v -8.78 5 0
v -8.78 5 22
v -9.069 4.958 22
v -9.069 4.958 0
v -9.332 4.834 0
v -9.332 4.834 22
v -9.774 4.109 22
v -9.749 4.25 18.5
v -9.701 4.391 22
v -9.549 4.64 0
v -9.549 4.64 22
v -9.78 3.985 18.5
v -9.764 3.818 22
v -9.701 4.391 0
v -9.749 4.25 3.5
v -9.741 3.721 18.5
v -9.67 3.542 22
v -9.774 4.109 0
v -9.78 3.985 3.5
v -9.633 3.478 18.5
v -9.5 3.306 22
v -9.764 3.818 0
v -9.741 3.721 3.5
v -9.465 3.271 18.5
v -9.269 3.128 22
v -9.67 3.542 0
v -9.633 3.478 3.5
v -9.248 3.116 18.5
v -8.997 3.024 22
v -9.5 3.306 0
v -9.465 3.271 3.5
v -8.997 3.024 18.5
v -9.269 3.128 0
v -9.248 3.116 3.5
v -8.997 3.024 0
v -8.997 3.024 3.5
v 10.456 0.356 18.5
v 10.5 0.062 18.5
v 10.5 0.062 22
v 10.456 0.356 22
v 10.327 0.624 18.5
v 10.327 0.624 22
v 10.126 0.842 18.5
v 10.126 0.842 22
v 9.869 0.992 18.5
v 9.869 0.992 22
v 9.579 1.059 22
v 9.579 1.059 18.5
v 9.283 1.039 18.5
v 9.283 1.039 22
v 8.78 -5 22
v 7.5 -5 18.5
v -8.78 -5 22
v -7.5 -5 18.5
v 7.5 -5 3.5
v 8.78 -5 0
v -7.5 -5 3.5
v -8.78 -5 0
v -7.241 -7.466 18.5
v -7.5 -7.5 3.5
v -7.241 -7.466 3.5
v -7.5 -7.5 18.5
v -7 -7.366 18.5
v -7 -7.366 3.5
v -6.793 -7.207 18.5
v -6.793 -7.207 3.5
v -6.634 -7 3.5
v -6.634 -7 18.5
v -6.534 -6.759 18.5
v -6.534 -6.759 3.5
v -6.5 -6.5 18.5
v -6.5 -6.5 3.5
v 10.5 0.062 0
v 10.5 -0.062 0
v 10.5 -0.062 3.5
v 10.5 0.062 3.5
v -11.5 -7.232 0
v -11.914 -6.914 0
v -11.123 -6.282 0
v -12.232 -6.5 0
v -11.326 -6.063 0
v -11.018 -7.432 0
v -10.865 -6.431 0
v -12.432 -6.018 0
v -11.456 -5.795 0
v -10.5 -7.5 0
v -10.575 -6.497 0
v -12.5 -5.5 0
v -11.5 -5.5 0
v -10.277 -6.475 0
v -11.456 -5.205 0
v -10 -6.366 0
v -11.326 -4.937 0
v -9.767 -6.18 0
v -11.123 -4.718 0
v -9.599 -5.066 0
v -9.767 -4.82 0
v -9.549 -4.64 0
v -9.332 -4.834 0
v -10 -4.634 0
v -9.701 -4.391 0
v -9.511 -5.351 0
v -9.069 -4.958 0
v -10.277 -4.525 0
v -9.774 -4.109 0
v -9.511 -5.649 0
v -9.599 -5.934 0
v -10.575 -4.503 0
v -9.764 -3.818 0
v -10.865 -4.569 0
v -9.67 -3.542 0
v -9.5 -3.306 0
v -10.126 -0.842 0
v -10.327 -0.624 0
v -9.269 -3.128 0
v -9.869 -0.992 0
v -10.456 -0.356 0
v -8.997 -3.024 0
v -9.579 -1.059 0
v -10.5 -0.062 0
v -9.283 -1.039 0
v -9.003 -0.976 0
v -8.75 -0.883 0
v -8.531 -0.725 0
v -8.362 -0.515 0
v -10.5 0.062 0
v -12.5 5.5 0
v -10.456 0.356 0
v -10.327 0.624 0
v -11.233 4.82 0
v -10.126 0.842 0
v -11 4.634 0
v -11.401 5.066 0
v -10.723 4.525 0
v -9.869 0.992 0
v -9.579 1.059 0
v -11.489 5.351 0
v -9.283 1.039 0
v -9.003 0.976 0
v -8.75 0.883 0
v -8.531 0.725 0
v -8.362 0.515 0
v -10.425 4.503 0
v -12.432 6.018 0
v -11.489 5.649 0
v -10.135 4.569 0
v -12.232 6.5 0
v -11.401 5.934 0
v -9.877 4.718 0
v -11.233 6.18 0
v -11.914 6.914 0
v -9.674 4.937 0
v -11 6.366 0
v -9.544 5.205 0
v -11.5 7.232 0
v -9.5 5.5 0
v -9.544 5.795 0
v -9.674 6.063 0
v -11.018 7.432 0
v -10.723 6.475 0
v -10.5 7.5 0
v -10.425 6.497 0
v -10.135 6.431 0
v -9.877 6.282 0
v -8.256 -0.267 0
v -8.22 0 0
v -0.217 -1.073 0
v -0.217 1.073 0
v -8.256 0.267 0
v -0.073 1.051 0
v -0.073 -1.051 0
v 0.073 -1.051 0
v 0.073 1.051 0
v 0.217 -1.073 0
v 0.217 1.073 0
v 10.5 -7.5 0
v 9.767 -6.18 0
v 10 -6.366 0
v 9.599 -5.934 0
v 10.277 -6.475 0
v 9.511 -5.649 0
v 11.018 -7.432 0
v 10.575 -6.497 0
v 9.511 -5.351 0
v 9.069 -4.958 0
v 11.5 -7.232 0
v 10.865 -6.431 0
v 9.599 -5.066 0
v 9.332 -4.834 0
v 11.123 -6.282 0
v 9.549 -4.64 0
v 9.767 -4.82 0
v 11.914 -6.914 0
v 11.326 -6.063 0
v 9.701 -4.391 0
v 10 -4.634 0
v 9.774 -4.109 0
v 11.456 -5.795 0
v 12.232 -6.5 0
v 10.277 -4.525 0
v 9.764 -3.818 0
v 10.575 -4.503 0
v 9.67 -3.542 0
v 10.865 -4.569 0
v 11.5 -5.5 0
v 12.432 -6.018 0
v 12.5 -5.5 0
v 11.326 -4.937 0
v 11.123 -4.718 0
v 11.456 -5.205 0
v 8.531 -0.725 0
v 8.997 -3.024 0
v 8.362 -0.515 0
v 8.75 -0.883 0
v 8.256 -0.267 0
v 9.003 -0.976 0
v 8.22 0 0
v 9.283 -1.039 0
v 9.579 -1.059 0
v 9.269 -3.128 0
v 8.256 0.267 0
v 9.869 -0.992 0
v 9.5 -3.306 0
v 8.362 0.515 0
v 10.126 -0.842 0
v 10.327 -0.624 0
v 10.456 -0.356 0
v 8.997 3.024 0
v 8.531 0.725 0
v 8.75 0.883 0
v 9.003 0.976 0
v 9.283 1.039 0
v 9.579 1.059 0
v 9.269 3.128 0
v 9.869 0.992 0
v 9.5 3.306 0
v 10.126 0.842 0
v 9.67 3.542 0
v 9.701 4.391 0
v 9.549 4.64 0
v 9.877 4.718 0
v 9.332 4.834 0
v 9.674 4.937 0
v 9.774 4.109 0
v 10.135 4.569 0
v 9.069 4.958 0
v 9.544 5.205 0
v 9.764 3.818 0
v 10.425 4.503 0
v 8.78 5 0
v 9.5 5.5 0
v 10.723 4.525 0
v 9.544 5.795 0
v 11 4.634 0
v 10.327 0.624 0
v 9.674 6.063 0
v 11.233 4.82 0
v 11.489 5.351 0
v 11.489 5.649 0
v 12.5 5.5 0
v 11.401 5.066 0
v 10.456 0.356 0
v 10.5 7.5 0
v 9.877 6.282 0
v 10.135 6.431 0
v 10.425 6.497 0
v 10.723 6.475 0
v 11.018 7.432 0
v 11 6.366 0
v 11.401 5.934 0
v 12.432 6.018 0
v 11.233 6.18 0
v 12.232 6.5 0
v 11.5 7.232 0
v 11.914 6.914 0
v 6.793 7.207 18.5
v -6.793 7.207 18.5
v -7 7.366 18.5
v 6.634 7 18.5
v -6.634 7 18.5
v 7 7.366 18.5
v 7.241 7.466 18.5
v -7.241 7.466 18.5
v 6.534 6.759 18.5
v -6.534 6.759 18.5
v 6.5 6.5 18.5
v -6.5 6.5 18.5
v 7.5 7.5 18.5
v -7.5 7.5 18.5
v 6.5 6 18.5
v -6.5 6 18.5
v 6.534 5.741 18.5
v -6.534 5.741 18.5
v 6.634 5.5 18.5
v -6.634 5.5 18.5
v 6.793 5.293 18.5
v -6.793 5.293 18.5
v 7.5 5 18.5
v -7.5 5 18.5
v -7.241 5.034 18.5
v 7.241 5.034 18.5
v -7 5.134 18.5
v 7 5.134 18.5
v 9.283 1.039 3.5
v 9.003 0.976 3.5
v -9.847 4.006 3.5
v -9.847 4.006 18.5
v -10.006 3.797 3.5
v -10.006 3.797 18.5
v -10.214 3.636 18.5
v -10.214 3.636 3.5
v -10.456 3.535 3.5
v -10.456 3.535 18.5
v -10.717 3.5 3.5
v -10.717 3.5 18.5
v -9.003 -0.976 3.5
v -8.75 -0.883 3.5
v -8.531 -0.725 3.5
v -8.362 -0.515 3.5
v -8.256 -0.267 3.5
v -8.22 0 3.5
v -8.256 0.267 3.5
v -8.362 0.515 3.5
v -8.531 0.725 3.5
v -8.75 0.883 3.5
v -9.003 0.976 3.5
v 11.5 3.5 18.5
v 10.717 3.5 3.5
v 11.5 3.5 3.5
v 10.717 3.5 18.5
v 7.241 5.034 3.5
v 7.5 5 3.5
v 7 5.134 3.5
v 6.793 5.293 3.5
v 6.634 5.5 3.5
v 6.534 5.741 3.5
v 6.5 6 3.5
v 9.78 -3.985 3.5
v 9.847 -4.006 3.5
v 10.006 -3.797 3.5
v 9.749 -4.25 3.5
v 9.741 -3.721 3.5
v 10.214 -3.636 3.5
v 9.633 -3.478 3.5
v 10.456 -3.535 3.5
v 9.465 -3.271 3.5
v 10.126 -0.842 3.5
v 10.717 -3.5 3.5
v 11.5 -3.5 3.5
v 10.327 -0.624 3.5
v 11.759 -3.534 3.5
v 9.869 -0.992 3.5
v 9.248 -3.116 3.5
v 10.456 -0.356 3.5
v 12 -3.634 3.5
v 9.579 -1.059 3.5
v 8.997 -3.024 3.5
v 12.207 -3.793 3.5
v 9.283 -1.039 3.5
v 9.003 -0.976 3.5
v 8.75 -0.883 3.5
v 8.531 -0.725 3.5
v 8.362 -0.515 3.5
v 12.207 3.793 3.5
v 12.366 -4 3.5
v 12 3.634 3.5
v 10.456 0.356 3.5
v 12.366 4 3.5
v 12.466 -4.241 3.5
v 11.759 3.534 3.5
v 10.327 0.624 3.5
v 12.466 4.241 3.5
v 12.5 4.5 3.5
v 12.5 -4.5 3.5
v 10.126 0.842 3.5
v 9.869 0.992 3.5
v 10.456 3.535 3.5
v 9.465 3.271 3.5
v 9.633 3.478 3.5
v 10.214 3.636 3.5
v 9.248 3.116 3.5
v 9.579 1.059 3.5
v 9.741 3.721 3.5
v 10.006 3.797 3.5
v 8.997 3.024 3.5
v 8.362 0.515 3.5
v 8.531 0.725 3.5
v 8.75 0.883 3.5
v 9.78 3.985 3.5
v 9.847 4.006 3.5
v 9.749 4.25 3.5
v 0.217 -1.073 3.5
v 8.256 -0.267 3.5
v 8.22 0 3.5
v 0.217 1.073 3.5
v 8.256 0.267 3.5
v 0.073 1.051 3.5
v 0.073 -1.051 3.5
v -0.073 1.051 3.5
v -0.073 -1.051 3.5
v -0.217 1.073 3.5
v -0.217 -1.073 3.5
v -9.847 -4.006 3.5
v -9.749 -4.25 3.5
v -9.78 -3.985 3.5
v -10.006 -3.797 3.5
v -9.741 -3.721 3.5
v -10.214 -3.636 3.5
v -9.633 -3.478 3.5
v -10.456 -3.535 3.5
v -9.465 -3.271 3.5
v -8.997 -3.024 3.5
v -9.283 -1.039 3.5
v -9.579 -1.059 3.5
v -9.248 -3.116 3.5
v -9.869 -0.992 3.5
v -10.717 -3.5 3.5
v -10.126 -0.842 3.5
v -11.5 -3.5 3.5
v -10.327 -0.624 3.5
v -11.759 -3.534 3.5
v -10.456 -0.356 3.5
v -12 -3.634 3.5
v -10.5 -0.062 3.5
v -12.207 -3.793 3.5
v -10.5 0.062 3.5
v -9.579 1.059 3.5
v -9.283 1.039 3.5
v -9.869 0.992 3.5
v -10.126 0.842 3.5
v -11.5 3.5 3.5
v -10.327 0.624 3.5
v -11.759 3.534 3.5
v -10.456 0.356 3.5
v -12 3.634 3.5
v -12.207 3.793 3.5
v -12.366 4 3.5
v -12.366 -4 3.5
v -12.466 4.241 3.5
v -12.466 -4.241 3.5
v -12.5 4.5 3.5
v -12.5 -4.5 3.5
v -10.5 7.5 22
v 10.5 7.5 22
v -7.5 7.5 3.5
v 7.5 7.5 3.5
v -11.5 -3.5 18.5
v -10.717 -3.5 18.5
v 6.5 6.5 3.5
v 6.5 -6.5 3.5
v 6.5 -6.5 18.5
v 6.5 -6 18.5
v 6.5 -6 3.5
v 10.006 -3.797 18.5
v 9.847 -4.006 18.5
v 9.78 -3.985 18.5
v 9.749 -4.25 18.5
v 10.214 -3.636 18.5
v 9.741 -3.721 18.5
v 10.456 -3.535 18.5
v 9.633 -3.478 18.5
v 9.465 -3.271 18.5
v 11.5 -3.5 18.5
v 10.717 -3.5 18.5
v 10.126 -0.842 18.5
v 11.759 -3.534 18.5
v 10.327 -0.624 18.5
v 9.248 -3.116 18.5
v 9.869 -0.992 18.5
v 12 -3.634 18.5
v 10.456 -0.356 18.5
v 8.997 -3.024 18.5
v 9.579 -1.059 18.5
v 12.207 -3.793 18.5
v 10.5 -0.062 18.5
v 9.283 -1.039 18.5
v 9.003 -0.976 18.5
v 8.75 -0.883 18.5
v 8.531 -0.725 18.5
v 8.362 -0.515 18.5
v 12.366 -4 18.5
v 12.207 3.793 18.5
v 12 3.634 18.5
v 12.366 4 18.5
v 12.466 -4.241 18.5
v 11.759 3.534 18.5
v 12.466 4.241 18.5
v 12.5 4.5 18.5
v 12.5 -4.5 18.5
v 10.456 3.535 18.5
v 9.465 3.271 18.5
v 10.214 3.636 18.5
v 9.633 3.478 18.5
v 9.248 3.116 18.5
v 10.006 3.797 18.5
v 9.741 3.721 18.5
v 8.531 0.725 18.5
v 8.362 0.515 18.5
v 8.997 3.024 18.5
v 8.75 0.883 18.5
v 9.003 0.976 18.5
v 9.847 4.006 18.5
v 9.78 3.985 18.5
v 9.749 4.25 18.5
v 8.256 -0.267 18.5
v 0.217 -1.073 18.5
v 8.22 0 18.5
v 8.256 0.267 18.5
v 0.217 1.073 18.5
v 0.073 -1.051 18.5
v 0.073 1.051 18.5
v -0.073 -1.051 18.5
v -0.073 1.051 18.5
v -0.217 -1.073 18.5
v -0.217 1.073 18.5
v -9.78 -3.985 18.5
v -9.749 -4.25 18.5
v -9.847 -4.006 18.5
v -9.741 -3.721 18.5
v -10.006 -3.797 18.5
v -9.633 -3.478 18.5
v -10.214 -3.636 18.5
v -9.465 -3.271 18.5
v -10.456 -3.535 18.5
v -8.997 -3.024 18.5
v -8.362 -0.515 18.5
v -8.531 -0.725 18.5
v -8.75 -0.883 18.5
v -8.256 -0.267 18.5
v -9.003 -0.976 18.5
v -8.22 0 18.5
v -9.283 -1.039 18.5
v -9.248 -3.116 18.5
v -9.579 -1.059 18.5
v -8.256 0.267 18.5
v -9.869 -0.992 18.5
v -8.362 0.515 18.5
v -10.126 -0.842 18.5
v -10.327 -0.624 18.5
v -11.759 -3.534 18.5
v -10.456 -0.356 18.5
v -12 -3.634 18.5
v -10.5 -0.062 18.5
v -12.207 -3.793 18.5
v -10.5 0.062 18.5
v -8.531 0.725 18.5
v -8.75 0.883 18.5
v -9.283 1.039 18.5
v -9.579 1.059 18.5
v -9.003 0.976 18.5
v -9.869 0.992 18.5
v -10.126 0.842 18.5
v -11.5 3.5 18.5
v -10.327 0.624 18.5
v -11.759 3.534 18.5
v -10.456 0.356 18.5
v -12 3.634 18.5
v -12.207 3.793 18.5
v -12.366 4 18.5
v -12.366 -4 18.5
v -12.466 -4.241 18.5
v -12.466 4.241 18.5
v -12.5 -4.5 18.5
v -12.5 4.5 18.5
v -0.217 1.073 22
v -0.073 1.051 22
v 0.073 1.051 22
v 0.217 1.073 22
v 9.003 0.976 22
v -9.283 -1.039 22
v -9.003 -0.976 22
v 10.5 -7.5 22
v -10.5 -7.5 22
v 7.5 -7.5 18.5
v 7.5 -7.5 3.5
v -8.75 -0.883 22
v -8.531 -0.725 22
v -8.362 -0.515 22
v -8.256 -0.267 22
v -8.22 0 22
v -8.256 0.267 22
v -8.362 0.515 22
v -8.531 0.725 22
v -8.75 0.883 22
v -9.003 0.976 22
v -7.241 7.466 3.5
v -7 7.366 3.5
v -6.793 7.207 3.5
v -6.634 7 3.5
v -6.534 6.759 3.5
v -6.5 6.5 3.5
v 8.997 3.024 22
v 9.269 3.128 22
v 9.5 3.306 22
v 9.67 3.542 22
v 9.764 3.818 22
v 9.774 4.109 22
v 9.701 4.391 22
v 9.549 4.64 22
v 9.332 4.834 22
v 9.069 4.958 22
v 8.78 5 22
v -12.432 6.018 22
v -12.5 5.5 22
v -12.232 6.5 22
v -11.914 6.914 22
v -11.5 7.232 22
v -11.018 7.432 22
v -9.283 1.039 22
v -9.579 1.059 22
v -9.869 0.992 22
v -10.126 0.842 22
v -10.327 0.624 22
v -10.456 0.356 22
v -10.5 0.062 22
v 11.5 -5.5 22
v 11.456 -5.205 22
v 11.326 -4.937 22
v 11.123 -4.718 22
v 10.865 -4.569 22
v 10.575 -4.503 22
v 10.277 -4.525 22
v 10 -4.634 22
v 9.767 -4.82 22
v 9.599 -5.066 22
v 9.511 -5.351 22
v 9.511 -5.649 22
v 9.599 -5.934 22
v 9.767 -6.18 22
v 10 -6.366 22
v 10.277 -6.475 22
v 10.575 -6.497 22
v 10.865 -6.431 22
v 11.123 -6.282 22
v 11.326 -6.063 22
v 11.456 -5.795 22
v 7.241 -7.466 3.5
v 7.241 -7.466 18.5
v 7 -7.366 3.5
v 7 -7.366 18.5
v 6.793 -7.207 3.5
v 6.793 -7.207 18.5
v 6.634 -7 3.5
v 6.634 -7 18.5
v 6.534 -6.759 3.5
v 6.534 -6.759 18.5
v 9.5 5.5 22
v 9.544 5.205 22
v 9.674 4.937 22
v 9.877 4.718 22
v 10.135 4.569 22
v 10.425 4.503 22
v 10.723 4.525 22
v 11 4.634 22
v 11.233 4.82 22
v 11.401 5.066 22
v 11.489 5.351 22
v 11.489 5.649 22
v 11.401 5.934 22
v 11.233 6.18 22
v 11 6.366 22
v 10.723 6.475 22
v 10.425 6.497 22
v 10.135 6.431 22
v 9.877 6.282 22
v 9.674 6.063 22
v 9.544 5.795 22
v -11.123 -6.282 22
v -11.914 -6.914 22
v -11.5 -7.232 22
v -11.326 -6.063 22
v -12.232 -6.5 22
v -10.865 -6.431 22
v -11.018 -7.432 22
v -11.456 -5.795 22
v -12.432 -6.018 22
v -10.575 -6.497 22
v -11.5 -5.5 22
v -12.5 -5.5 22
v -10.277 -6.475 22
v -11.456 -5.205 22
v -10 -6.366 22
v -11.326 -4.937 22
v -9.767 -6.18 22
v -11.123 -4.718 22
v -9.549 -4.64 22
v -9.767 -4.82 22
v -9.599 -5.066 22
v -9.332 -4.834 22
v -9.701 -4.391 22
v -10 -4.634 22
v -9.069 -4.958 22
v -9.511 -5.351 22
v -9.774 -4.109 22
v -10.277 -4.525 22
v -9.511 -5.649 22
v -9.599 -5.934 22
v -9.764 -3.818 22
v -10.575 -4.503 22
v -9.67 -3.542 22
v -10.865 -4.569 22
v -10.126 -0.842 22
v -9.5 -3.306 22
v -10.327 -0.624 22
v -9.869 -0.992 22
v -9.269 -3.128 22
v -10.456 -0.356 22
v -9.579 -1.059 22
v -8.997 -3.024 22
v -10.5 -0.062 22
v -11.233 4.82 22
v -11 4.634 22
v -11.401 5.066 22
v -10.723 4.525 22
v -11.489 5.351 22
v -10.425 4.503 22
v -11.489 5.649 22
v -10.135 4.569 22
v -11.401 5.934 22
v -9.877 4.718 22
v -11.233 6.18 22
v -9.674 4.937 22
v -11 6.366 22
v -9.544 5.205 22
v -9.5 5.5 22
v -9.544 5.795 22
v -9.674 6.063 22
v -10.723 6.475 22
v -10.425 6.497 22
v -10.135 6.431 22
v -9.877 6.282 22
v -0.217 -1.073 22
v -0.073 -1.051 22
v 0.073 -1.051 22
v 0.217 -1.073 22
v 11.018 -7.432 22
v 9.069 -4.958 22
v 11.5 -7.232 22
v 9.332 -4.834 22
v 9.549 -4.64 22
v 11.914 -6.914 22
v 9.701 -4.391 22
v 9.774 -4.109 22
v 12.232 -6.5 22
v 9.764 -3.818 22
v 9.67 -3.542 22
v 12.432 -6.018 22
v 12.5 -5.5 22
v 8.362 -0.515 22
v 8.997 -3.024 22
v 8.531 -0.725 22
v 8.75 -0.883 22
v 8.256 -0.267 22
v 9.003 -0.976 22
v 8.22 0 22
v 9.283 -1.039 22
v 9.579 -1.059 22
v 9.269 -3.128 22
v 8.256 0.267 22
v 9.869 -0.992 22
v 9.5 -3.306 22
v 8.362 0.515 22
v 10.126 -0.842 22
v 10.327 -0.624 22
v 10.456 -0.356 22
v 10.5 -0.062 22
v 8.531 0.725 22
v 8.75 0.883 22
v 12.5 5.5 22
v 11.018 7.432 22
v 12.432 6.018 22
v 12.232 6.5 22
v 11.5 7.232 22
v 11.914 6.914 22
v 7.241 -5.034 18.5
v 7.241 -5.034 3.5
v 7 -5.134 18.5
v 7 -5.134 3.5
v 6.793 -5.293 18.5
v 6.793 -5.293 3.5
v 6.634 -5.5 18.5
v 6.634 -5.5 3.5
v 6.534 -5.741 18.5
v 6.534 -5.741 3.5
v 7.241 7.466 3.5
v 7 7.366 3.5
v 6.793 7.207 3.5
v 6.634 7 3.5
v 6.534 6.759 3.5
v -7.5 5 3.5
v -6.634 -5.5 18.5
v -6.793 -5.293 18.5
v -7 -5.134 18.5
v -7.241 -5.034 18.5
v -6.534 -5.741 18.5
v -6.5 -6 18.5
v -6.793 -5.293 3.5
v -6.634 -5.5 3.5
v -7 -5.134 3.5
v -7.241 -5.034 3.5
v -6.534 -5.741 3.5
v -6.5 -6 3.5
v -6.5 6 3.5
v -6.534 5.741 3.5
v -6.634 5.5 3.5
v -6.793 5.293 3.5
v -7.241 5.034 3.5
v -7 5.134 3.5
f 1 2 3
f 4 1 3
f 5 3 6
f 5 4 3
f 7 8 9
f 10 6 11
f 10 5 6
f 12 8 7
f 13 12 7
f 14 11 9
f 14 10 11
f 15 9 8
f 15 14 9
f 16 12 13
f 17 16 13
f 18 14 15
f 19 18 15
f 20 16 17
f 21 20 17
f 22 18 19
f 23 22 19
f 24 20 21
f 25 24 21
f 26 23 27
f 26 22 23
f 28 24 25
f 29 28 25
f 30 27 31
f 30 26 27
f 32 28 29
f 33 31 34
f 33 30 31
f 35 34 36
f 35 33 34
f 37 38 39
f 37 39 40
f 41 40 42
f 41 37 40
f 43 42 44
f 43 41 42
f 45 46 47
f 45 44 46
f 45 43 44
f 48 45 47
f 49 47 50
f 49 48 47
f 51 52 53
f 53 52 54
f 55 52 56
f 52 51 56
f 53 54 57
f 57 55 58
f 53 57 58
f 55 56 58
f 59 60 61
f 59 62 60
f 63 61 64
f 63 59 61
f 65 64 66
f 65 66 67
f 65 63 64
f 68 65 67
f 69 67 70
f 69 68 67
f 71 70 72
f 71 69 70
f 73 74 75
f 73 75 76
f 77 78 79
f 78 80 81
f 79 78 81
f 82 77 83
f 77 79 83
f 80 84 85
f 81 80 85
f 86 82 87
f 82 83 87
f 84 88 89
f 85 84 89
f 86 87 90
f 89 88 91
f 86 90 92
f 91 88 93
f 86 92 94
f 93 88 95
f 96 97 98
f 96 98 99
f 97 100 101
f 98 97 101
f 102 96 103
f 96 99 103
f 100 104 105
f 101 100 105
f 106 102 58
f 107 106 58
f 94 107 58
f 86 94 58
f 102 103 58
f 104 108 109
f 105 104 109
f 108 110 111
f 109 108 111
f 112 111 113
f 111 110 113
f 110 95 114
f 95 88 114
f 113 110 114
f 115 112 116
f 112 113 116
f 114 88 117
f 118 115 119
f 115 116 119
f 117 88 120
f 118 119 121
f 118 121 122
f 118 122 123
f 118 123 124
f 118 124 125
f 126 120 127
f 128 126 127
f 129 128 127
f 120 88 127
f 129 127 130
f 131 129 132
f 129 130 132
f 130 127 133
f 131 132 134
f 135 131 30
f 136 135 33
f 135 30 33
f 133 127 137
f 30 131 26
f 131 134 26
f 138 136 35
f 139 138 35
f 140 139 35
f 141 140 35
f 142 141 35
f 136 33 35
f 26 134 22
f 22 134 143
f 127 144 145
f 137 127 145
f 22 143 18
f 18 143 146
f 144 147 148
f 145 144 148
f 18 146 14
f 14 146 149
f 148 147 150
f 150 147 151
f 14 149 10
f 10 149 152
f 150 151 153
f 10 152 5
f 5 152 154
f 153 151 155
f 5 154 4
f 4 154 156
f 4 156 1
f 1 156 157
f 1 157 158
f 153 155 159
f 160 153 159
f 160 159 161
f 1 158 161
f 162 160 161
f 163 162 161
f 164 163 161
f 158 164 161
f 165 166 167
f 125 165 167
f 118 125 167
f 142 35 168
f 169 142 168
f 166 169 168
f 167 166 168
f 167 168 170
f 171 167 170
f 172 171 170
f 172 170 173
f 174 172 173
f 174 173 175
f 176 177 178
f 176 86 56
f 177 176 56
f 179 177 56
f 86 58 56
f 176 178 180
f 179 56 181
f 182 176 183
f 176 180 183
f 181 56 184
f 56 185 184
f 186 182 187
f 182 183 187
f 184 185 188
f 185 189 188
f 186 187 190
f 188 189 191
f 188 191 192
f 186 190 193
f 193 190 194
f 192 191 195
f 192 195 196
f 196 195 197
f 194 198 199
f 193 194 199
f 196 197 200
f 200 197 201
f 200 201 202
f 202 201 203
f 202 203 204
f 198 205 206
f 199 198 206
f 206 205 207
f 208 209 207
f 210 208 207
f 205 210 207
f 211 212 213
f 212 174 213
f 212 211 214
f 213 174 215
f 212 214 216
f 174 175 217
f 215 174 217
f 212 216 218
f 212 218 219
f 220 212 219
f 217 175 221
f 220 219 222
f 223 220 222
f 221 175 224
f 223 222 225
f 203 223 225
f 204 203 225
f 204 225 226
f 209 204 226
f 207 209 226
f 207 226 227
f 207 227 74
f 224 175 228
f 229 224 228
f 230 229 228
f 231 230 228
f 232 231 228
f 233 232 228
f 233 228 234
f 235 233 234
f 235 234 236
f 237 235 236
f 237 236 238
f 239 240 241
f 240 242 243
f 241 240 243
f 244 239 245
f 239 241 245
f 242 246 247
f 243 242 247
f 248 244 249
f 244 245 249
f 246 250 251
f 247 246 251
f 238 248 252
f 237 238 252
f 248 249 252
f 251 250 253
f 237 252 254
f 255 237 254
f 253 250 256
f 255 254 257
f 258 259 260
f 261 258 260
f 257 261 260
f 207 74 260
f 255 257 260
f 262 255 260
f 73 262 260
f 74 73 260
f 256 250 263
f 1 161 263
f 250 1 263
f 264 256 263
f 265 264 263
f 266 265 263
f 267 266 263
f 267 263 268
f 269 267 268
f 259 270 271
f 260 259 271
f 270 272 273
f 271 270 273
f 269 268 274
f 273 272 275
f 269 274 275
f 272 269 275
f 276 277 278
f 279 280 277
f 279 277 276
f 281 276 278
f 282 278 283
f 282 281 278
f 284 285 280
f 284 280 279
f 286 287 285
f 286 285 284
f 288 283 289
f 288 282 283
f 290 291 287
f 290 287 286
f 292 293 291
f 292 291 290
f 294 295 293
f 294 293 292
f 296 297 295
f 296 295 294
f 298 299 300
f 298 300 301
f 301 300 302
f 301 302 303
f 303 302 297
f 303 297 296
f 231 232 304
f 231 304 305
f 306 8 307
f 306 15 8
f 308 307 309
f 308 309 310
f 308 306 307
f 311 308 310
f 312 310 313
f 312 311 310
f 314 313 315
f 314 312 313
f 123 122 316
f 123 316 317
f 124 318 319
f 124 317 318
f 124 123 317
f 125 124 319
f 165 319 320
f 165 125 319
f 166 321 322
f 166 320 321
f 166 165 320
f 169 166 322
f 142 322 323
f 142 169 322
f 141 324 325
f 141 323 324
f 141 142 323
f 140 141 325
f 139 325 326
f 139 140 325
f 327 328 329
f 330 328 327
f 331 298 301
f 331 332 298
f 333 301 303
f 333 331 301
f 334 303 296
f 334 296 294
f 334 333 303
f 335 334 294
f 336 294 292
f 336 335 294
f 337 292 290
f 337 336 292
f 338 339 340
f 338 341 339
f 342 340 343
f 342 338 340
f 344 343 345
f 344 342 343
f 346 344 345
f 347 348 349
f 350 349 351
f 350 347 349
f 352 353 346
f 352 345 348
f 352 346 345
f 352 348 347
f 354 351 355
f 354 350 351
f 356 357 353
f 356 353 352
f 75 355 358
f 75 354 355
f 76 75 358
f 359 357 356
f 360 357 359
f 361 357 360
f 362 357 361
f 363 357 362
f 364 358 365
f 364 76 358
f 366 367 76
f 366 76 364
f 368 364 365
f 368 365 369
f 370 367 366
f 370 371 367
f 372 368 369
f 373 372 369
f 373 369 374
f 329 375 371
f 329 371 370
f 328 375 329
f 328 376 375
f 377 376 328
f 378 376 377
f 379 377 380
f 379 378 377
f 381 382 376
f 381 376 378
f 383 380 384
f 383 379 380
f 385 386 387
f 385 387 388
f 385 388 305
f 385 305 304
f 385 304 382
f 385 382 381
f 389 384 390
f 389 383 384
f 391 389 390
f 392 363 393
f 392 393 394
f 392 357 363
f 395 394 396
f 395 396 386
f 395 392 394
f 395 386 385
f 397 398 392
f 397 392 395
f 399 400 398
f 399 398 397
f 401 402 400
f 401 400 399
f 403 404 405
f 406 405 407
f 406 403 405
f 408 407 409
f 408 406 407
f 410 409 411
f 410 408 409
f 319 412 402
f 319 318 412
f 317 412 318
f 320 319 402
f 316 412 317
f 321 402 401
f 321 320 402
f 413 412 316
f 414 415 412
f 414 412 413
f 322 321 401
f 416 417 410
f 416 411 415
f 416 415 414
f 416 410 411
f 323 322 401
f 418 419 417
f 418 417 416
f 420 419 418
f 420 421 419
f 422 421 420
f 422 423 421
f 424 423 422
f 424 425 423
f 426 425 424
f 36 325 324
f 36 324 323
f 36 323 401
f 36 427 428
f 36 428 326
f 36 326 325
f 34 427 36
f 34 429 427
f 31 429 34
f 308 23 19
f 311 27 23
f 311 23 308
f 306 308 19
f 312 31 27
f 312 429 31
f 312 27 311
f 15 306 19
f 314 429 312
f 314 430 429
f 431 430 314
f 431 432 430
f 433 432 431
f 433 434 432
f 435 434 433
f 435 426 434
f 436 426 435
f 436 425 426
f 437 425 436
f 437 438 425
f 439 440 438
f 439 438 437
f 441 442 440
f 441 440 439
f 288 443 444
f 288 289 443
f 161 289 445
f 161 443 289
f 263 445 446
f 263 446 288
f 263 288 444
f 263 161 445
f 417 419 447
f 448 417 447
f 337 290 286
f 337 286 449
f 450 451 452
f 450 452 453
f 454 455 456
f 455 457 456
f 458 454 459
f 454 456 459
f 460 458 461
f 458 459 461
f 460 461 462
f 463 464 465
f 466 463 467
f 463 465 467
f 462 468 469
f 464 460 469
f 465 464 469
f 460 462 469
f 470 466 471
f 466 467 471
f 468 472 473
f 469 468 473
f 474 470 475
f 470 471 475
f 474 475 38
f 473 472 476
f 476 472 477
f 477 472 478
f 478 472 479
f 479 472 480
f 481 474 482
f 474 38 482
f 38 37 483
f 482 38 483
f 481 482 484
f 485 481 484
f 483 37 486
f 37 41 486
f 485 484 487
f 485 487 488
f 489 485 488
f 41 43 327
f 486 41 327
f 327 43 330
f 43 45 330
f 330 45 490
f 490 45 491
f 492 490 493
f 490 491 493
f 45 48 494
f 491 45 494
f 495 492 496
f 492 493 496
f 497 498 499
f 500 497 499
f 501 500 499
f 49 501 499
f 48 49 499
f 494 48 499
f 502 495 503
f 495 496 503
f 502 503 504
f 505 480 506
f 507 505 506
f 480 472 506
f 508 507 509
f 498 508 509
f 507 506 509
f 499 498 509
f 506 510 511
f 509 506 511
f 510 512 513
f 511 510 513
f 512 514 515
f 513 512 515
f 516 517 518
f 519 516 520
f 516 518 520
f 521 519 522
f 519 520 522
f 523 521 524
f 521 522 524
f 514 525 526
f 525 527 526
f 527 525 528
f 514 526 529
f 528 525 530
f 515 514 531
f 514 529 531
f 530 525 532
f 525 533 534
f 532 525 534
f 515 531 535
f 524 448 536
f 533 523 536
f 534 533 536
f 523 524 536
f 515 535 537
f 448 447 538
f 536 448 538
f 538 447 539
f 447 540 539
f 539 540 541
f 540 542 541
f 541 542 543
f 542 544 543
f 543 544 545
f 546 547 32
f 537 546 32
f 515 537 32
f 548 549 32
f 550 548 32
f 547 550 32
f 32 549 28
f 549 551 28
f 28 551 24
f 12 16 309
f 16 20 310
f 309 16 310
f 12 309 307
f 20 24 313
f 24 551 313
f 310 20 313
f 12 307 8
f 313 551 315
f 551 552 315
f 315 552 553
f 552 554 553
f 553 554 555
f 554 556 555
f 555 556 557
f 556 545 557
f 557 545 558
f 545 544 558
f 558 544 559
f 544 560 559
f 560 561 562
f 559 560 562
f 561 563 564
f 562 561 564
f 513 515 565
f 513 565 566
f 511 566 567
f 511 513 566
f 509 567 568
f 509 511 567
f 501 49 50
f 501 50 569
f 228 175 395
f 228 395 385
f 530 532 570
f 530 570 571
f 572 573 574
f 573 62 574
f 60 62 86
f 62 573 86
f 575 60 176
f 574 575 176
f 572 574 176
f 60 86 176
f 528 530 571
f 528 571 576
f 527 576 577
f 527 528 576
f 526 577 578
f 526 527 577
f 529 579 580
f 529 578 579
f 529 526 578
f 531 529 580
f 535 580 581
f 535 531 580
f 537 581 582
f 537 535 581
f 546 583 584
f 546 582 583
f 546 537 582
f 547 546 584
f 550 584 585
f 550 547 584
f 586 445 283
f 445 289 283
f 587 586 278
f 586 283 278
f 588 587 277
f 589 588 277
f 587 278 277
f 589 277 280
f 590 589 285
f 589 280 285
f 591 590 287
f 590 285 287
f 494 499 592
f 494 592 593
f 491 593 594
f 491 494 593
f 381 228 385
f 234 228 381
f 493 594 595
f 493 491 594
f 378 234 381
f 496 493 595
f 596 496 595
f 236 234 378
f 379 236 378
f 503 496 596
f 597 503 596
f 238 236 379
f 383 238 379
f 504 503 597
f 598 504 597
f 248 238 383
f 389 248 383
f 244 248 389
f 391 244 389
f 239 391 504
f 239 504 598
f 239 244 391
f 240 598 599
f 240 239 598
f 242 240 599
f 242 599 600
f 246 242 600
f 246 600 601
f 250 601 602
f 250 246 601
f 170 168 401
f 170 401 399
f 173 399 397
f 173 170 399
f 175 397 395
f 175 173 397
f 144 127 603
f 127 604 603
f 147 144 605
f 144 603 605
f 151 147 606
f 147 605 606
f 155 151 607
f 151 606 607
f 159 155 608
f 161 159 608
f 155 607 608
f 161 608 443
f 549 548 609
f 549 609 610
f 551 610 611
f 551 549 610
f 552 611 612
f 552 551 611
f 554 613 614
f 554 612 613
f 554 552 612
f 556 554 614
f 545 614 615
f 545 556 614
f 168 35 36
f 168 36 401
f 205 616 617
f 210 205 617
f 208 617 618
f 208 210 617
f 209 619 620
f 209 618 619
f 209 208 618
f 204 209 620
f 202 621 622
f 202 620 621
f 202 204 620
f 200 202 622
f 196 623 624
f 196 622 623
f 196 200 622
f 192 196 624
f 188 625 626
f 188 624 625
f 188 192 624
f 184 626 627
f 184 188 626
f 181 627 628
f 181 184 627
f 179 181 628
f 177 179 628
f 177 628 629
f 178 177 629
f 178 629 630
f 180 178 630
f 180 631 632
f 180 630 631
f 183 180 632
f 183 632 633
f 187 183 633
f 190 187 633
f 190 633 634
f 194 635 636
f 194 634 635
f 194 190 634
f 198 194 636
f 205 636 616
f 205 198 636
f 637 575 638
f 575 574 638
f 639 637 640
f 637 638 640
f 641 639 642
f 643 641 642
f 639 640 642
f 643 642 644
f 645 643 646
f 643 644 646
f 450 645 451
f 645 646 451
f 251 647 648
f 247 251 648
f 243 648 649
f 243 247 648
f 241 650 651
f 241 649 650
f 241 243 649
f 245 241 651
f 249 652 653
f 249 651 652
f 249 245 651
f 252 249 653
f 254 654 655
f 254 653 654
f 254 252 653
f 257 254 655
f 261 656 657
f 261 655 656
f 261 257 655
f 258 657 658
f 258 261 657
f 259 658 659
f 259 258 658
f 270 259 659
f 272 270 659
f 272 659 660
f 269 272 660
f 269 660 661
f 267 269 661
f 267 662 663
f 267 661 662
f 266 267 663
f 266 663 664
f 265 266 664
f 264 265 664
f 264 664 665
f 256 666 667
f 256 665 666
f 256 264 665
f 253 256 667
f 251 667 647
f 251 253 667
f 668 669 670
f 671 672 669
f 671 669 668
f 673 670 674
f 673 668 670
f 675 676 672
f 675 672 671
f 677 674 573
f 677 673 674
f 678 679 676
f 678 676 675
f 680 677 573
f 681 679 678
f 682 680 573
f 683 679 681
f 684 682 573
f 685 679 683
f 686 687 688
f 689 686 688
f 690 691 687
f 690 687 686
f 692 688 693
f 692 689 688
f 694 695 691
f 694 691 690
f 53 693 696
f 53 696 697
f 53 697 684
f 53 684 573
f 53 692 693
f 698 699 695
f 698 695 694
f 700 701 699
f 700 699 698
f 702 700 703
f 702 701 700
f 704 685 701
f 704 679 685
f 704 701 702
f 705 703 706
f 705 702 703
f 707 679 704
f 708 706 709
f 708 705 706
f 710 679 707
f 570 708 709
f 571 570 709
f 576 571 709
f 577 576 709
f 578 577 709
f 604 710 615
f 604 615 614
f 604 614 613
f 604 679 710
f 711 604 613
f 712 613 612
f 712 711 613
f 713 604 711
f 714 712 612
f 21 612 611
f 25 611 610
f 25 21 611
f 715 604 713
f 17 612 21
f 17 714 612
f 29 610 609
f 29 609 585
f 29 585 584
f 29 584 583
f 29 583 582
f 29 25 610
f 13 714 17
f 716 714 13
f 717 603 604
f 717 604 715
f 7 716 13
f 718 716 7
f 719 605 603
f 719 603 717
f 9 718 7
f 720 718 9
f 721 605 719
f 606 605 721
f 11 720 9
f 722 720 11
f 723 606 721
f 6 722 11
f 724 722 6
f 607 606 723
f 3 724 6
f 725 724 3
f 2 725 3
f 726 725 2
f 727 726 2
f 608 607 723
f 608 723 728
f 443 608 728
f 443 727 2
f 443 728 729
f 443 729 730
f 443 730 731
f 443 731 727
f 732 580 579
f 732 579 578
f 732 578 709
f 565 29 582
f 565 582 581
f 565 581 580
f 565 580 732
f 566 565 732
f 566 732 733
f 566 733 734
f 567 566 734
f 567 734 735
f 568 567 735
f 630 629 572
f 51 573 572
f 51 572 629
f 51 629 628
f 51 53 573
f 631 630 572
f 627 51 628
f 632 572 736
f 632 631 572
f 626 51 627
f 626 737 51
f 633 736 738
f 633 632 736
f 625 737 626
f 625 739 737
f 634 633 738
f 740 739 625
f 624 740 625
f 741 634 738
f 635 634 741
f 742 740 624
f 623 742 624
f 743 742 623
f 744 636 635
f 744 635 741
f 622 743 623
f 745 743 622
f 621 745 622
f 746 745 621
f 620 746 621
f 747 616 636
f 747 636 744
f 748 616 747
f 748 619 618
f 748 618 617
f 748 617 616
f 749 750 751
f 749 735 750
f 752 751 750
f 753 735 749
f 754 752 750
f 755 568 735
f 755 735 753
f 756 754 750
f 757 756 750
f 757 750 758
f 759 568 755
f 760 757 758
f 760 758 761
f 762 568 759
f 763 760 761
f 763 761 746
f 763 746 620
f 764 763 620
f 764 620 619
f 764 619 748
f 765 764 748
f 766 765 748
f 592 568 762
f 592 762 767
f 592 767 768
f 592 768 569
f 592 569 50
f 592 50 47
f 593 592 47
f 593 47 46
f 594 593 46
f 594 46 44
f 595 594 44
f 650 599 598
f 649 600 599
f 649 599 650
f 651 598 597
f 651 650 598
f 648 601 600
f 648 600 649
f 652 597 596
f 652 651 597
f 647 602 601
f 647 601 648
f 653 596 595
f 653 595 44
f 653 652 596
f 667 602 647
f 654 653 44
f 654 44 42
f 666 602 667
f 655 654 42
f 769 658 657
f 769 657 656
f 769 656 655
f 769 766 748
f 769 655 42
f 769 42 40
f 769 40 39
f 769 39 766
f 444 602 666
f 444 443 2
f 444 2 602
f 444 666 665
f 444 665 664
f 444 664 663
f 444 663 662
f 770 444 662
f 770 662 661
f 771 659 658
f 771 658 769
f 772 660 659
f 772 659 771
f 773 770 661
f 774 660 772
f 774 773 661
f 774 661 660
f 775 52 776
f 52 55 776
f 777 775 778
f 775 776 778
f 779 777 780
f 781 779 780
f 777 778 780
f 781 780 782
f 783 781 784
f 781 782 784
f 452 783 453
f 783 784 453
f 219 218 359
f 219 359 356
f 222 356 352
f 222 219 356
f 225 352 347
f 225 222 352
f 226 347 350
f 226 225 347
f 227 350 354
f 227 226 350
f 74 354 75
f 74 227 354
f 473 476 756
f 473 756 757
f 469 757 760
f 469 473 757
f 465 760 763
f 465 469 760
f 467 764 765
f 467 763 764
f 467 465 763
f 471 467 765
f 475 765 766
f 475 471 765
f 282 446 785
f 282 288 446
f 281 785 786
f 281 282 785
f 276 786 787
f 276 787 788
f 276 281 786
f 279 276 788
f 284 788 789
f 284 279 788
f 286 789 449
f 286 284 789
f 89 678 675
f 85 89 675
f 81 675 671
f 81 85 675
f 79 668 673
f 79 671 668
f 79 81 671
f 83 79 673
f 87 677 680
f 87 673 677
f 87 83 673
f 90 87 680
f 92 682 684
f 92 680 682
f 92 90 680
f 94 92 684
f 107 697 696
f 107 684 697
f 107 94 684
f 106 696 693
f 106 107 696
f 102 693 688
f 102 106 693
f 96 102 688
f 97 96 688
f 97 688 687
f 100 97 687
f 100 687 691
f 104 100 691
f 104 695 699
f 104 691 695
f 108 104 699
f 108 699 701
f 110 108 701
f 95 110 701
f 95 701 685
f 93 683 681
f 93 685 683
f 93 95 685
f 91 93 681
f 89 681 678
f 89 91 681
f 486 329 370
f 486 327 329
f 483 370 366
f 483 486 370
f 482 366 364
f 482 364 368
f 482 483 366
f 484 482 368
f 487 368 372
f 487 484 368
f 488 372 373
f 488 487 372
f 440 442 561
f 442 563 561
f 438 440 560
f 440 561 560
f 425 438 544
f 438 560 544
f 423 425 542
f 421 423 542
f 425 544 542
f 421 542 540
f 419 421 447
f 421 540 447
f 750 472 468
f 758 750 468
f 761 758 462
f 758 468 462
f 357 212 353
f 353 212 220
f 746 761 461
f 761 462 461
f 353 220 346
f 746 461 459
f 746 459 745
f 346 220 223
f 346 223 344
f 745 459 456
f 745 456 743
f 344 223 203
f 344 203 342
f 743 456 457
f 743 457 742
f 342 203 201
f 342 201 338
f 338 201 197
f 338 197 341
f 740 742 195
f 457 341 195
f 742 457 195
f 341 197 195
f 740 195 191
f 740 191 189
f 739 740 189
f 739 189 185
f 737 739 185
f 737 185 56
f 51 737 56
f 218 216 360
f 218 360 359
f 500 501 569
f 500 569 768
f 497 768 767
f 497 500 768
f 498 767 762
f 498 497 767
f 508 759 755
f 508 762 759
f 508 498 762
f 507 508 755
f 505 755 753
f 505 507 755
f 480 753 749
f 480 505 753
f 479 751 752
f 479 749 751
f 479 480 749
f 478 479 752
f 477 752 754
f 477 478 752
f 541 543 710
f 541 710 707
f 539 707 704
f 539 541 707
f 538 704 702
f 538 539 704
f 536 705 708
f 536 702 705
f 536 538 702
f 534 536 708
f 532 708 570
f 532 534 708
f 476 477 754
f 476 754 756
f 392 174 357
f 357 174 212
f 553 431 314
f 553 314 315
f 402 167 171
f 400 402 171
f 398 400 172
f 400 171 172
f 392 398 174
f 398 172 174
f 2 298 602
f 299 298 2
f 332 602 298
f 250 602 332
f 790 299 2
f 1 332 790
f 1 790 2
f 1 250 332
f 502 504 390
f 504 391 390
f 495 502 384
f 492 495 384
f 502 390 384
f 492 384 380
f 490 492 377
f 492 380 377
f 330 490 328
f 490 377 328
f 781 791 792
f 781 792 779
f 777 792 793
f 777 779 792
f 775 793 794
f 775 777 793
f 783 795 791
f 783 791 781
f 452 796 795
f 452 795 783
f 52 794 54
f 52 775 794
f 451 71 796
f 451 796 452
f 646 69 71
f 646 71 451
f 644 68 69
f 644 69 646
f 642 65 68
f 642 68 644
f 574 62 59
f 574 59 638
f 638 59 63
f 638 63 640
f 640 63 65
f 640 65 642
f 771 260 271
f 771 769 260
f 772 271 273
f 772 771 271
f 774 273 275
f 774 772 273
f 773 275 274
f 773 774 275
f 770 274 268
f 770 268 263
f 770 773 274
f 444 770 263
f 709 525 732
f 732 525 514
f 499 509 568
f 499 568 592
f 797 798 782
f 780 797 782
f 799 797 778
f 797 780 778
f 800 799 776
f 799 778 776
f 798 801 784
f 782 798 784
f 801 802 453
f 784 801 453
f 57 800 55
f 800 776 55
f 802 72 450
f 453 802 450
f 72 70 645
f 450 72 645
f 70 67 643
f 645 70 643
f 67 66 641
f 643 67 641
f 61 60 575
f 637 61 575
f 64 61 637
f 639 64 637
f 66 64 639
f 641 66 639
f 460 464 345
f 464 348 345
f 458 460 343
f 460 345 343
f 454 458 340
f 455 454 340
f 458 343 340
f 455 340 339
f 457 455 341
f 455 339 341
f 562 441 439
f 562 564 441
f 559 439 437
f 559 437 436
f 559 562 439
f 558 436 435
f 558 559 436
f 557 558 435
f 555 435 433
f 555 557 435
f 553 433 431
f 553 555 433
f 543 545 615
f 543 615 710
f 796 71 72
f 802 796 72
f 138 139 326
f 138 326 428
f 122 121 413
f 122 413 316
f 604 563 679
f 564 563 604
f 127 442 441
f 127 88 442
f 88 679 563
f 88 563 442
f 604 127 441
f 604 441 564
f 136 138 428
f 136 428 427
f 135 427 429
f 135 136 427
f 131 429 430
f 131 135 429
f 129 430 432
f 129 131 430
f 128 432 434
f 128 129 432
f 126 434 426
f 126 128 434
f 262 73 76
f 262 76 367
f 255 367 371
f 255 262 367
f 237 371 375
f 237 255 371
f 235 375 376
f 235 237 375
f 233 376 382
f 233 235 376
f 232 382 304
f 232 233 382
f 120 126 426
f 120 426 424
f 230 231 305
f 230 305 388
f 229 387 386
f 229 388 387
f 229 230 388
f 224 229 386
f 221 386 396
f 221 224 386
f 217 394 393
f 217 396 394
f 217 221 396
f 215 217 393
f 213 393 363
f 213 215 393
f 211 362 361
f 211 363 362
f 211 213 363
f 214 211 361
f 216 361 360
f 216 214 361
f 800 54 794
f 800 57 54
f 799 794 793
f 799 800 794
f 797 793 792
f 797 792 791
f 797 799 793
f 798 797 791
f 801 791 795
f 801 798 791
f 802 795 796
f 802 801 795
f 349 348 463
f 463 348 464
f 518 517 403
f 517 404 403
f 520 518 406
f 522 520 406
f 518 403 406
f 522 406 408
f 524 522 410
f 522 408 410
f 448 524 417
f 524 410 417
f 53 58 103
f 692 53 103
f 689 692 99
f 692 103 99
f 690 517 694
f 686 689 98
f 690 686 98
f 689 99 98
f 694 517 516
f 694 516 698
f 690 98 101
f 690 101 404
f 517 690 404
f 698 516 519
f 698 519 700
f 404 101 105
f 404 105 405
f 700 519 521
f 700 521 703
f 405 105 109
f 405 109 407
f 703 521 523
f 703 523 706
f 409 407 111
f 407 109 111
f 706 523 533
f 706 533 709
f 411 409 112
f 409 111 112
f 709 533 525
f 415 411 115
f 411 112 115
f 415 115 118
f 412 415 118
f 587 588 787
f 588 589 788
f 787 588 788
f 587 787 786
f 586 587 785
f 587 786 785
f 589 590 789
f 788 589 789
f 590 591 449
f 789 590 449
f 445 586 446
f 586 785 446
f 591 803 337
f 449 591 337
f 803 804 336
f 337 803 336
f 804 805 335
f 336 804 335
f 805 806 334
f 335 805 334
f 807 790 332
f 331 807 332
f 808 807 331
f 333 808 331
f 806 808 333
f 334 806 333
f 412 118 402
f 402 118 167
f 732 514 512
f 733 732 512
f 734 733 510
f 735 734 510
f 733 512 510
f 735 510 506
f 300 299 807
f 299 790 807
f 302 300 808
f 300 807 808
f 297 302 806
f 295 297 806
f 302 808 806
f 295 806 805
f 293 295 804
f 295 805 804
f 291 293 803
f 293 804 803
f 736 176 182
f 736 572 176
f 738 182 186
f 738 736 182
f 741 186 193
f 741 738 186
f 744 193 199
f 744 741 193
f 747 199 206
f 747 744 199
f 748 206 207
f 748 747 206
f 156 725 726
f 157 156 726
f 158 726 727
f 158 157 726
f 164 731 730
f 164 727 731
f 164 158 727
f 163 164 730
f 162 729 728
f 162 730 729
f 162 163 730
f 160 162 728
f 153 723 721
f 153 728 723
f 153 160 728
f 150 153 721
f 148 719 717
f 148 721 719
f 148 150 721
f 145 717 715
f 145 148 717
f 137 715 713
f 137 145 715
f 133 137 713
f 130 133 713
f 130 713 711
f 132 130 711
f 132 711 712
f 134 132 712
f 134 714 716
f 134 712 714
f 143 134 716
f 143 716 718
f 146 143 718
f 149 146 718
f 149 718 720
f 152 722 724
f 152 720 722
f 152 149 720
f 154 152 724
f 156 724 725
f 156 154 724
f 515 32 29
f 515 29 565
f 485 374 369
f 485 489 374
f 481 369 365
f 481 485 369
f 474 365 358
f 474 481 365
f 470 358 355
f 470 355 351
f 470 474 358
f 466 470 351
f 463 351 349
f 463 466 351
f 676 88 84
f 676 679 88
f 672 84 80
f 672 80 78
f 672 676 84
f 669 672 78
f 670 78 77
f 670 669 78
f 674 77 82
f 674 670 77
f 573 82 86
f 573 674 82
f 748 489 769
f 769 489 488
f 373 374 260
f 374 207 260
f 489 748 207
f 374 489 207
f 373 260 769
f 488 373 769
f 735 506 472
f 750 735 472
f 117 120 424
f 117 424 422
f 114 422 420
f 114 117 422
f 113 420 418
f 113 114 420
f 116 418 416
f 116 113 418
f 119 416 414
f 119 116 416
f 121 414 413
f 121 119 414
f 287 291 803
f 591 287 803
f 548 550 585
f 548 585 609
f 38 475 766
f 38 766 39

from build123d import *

# Parameters (mm, degrees)
SKETCH_1_W               = 25
SKETCH_1_H               = 15
EXTRUDE_1_DEPTH          = 22
FILLET_4_R               = 2
CUT_EXTRUDE_3_DEPTH      = 27.391286441
CUT_EXTRUDE_3_DEPTH_BACK = 27.391286441
CUT_EXTRUDE_4_DEPTH      = 27.391286441
CUT_EXTRUDE_4_DEPTH_BACK = 27.391286441
SKETCH_3_R               = 1
CUT_EXTRUDE_5_DEPTH      = 30.41513216
CUT_EXTRUDE_5_DEPTH_BACK = 30.41513216
SKETCH_4_W               = 13
SKETCH_4_H               = 15
SKETCH_5_W               = 15
SKETCH_5_H               = 7
CUT_EXTRUDE_6_DEPTH      = 35.135758377
FILLET_5_R               = 1


with BuildPart() as part:
    # 草图1 → 凸台-拉伸1 (new body)
    with BuildSketch(Plane.XY):
        Rectangle(SKETCH_1_W, SKETCH_1_H)
    extrude(amount=EXTRUDE_1_DEPTH)

    # 圆角4
    fillet_4_edges = [part.edges().sort_by_distance(p)[0] for p in [
        (12.5, -7.5, 11),
        (-12.5, -7.5, 11),
        (-12.5, 7.5, 11),
        (12.5, 7.5, 11),
    ]]
    fillet(fillet_4_edges, radius=FILLET_4_R)

    # 草图2 → 切除-拉伸3 (cut, two sides: drawn at the far end of the back side and taken through both)
    with BuildSketch(Plane.XY.offset(22).offset(-CUT_EXTRUDE_3_DEPTH_BACK)):
        with BuildLine():
            Line((-10.5, 0.062323454), (-10.5, -0.062323454))
            ThreePointArc((-10.5, -0.062323454), (-10.125727394, -0.842365266), (-9.283069542, -1.038510514))
            Line((-9.283069542, -1.038510514), (-9.002613999, -0.97618706))
            ThreePointArc((-9.002613999, -0.97618706), (-8.219544457, 0), (-9.002613999, 0.97618706))
            Line((-9.002613999, 0.97618706), (-9.283069542, 1.038510514))
            ThreePointArc((-9.283069542, 1.038510514), (-10.125727394, 0.842365266), (-10.5, 0.062323454))
        make_face()
        with BuildLine():
            Line((0.216930458, 1.072600597), (8.997386001, 3.02381294))
            ThreePointArc((8.997386001, 3.02381294), (9.774484481, 4.109116772), (8.780455543, 5))
            Line((8.780455543, 5), (-8.780455543, 5))
            ThreePointArc((-8.780455543, 5), (-9.774484481, 4.109116772), (-8.997386001, 3.02381294))
            Line((-8.997386001, 3.02381294), (-0.216930458, 1.072600597))
            ThreePointArc((-0.216930458, 1.072600597), (0, 1.048787657), (0.216930458, 1.072600597))
        make_face()
        with BuildLine():
            Line((9.283069542, 1.038510514), (9.002613999, 0.97618706))
            ThreePointArc((9.002613999, 0.97618706), (8.219544457, 0), (9.002613999, -0.97618706))
            Line((9.002613999, -0.97618706), (9.283069542, -1.038510514))
            ThreePointArc((9.283069542, -1.038510514), (10.125727394, -0.842365266), (10.5, -0.062323454))
            Line((10.5, -0.062323454), (10.5, 0.062323454))
            ThreePointArc((10.5, 0.062323454), (10.125727394, 0.842365266), (9.283069542, 1.038510514))
        make_face()
        with BuildLine():
            Line((8.780455543, -5), (-8.780455543, -5))
            ThreePointArc((-8.780455543, -5), (-9.774484481, -4.109116772), (-8.997386001, -3.02381294))
            Line((-8.997386001, -3.02381294), (-0.216930458, -1.072600597))
            ThreePointArc((-0.216930458, -1.072600597), (0, -1.048787657), (0.216930458, -1.072600597))
            Line((0.216930458, -1.072600597), (8.997386001, -3.02381294))
            ThreePointArc((8.997386001, -3.02381294), (9.774484481, -4.109116772), (8.780455543, -5))
        make_face()
    extrude(amount=CUT_EXTRUDE_3_DEPTH + CUT_EXTRUDE_3_DEPTH_BACK, mode=Mode.SUBTRACT)

    # 草图3 → 切除-拉伸4 (cut, two sides: drawn at the far end of the back side and taken through both)
    with BuildSketch(Plane.XY.offset(22).offset(-CUT_EXTRUDE_4_DEPTH_BACK)):
        with Locations((-10.5, 5.5)):
            Circle(SKETCH_3_R)
        with Locations(Location((10.5, 5.5, 0), (0, 0, 180))):
            Circle(SKETCH_3_R)
        with Locations((10.5, -5.5)):
            Circle(SKETCH_3_R)
        with Locations(Location((-10.5, -5.5, 0), (0, 0, 180))):
            Circle(SKETCH_3_R)
    extrude(amount=CUT_EXTRUDE_4_DEPTH + CUT_EXTRUDE_4_DEPTH_BACK, mode=Mode.SUBTRACT)

    # 草图4 → 切除-拉伸5 (cut, two sides: drawn at the far end of the back side and taken through both)
    with BuildSketch(Plane(origin=(0, 7.5, 0), x_dir=(1, 0, 0), z_dir=(0, 1, 0)).offset(-CUT_EXTRUDE_5_DEPTH_BACK)):
        with Locations((0, -11)):
            Rectangle(SKETCH_4_W, SKETCH_4_H)
    extrude(amount=CUT_EXTRUDE_5_DEPTH + CUT_EXTRUDE_5_DEPTH_BACK, mode=Mode.SUBTRACT)

    # 草图5 → 切除-拉伸6 (cut, through all)
    with BuildSketch(Plane.ZY.offset(12.5)):
        with Locations((11, 0)):
            Rectangle(SKETCH_5_W, SKETCH_5_H)
    extrude(amount=-CUT_EXTRUDE_6_DEPTH, mode=Mode.SUBTRACT)

    # 圆角5
    fillet_5_edges = [part.edges().sort_by_distance(p)[0] for p in [
        (-6.5, 5, 11),
        (-6.5, 7.5, 11),
        (-6.5, -5, 11),
        (-6.5, -7.5, 11),
        (6.5, 7.5, 11),
        (6.5, 5, 11),
        (6.5, -5, 11),
        (6.5, -7.5, 11),
        (9.646480946, 3.5, 11),
        (-9.646480946, -3.5, 11),
        (9.646480946, -3.5, 11),
        (12.5, -3.5, 11),
        (-9.646480946, 3.5, 11),
        (12.5, 3.5, 11),
        (-12.5, 3.5, 11),
        (-12.5, -3.5, 11),
    ]]
    fillet(fillet_5_edges, radius=FILLET_5_R)


solid = part.part
